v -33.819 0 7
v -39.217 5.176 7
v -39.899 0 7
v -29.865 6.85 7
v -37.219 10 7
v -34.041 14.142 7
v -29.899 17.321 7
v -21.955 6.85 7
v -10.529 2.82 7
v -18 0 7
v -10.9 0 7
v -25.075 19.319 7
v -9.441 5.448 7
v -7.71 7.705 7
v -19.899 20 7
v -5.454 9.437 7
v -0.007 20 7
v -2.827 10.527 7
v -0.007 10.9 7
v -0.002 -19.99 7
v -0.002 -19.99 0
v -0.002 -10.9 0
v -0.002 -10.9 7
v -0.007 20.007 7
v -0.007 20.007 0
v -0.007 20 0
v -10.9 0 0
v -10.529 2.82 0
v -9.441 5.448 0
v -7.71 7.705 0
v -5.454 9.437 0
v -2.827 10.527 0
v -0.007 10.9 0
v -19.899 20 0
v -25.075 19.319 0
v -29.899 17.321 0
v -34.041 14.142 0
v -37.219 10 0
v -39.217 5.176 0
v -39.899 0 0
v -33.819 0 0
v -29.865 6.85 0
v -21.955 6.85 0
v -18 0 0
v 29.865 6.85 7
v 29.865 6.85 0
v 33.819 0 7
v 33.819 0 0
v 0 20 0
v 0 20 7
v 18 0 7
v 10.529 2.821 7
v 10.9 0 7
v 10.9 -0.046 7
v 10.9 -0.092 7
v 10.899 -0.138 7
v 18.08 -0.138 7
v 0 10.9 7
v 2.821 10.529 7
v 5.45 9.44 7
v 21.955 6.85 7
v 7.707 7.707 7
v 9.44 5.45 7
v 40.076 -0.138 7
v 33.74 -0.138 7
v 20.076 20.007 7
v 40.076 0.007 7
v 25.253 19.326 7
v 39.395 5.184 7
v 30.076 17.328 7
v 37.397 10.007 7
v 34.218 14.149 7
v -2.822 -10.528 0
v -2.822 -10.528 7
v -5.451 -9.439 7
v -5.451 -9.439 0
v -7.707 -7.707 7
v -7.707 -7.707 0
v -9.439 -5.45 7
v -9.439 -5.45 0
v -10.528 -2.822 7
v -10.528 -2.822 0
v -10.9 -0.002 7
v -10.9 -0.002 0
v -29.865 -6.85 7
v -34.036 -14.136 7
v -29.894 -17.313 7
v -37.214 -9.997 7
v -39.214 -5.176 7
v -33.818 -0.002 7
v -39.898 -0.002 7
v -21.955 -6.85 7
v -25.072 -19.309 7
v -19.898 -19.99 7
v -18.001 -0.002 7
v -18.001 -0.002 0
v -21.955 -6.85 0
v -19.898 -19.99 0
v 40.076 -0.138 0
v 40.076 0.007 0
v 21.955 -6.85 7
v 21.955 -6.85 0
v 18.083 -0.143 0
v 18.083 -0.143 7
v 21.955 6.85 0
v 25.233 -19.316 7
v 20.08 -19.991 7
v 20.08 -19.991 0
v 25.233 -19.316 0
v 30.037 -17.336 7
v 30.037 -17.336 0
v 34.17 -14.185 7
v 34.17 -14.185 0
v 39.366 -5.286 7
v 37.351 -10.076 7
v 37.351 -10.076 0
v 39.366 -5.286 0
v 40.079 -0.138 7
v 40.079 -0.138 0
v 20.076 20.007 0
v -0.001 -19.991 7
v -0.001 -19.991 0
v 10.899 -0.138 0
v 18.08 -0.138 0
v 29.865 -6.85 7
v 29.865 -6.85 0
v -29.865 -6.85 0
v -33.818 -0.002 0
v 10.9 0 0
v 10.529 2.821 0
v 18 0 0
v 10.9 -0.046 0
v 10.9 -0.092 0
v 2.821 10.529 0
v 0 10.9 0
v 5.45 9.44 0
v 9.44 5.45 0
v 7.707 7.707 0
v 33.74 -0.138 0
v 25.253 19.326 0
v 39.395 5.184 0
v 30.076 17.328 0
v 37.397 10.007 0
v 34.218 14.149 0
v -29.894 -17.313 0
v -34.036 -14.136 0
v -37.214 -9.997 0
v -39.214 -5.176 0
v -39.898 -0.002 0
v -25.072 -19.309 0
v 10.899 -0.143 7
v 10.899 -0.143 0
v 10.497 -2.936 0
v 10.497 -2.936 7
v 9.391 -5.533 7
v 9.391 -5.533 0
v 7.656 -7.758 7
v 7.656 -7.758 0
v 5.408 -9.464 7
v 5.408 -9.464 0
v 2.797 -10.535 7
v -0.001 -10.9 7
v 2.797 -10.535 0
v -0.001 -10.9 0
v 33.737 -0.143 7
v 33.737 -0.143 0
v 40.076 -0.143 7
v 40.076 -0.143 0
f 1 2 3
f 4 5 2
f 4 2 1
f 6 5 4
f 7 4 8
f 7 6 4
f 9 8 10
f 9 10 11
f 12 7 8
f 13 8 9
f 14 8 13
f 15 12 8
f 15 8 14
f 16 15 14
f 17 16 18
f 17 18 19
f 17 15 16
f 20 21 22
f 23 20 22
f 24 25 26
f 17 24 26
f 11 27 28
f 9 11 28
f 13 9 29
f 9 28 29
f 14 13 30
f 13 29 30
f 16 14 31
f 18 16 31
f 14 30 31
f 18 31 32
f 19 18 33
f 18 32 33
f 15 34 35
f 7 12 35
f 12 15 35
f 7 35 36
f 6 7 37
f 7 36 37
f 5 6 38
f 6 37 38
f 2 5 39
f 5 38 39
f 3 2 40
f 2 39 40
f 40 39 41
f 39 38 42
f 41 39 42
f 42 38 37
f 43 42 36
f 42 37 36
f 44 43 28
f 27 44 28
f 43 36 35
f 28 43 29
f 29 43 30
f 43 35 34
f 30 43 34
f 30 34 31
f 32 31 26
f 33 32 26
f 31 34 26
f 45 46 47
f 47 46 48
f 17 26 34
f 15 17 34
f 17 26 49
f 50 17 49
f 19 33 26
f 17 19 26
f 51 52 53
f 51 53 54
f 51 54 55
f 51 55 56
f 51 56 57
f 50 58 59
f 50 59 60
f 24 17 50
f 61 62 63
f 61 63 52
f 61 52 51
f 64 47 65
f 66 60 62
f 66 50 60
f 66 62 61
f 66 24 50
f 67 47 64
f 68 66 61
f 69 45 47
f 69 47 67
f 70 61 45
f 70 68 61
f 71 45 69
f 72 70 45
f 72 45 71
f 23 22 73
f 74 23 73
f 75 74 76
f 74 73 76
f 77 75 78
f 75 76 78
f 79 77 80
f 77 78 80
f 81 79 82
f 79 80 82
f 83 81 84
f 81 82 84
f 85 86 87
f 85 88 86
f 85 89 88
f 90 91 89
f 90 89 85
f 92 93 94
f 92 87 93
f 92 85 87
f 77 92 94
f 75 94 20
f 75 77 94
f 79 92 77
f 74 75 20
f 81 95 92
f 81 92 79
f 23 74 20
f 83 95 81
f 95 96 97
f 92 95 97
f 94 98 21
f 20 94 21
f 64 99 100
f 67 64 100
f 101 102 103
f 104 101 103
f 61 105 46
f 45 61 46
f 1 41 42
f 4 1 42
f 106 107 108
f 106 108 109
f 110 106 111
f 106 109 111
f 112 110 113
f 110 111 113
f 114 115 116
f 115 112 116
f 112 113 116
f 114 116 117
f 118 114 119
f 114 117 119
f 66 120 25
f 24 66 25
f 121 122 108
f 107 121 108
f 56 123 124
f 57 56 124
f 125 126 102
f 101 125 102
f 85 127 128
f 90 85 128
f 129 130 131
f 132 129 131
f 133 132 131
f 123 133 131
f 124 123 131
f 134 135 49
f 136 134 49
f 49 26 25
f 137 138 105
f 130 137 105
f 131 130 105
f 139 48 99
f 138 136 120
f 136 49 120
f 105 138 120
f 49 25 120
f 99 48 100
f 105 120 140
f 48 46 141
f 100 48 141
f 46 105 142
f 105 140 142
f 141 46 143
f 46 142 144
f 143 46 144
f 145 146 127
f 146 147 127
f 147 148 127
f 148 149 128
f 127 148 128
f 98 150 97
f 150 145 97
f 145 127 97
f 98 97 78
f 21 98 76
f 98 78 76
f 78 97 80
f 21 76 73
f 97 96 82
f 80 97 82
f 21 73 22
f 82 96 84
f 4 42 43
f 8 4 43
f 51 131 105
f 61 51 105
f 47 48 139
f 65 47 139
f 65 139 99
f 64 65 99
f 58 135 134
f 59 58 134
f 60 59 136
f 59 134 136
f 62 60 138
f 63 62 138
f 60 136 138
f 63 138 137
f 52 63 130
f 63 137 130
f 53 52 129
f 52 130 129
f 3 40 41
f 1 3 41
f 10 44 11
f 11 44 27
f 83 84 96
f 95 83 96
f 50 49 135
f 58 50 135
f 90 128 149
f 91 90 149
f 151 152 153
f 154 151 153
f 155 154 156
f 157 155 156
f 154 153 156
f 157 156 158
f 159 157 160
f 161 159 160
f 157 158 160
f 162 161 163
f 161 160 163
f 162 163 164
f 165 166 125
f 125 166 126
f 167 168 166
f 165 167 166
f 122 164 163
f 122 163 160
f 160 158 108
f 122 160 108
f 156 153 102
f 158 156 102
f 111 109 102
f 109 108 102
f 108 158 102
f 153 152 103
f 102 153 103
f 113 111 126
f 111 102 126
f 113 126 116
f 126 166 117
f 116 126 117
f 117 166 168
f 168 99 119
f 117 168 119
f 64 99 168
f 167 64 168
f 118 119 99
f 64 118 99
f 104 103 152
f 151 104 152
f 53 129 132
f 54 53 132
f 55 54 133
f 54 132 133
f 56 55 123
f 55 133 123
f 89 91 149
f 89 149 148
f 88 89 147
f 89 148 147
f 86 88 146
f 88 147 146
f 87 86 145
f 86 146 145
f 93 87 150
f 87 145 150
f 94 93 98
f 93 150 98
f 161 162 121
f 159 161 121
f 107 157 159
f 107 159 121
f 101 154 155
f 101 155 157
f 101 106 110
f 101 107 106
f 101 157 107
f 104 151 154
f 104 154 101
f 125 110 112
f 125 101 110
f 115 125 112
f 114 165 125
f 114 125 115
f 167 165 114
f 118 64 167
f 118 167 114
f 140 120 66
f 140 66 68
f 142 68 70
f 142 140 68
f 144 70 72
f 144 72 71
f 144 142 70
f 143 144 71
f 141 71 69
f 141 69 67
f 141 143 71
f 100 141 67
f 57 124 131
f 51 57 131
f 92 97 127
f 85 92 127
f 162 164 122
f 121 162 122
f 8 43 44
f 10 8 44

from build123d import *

# Parameters (mm, degrees)
F1_DEPTH      = 7
F2_T1_DEPTH   = 107
F2_2_T1_DEPTH = 107
F2_3_T1_DEPTH = 107
F2_4_T1_DEPTH = 107


# Not quite as in the source:
# - a fillet or chamfer that OpenCascade refuses, or shapes differently, is made with other operations: its cross-section is extruded or revolved along the edge and cut away or added


with BuildPart() as f1:
    # F0 (on Top) → F1 (new body)
    with BuildSketch(Plane.XY):
        with BuildLine():
            Line((-0.0071190066, 20.0072696805), (-0.0071190066, 20))
            Line((-0.0071190066, 20), (0, 20))
            Line((0, 20), (0, 10.9))
            ThreePointArc((0, 10.9), (7.7074639149, 7.7074639149), (10.9, 0))
            ThreePointArc((10.9, 0), (10.899781335, -0.0690423694), (10.8991253488, -0.1380819688))
            Line((10.8991253488, -0.1380819688), (18.0797216618, -0.1380819688))
            Line((18.0797216618, -0.1380819688), (18, 0))
            Line((18, 0), (21.9548493439, 6.85))
            Line((21.9548493439, 6.85), (29.8645480318, 6.85))
            Line((29.8645480318, 6.85), (33.8193973758, 0))
            Line((33.8193973758, 0), (33.739675714, -0.1380819688))
            Line((33.739675714, -0.1380819688), (40.0763135217, -0.1380819688))
            Line((40.0763135217, -0.1380819688), (40.0763135217, 20.0072696805))
            Line((40.0763135217, 20.0072696805), (-0.0071190066, 20.0072696805))
        make_face()
    extrude(amount=F1_DEPTH)

    # F2#4: fillet of radius 20 on 1 edges, made by hand

    # F2_4_s2 → F2_4_t1 (cut)
    with BuildSketch(Plane.XY.offset(-50)):
        with BuildLine():
            ThreePointArc((20.0763135217, 20.0072696805), (34.2184491454, 14.1494053042), (40.0763135217, 0.0072696805))
            Line((40.0763135217, 0.0072696805), (40.0763135217, 20.0072696805))
            Line((40.0763135217, 20.0072696805), (20.0763135217, 20.0072696805))
        make_face()
    extrude(amount=F2_4_T1_DEPTH, mode=Mode.SUBTRACT)


with BuildPart() as f1b:
    # F0 (on Top) → F1, piece 2 (new body)
    with BuildSketch(Plane.XY):
        with BuildLine():
            Line((-39.8988322914, 0), (-33.8193973758, 0))
            Line((-33.8193973758, 0), (-29.8645480318, 6.85))
            Line((-29.8645480318, 6.85), (-21.9548493439, 6.85))
            Line((-21.9548493439, 6.85), (-18, 0))
            Line((-18, 0), (-10.9, 0))
            ThreePointArc((-10.9, 0), (-7.709980453, 7.7049465549), (-0.0071190066, 10.8999976752))
            Line((-0.0071190066, 10.8999976752), (-0.0071190066, 20))
            Line((-0.0071190066, 20), (-39.8988322914, 20))
            Line((-39.8988322914, 20), (-39.8988322914, 0))
        make_face()
    extrude(amount=F1_DEPTH)

    # F2: fillet of radius 20 on 1 edges, made by hand

    # F2_s2 → F2_t1 (cut)
    with BuildSketch(Plane.XY.offset(-50)):
        with BuildLine():
            ThreePointArc((-19.8988322914, 20), (-34.0409679151, 14.1421356237), (-39.8988322914, 0))
            Line((-39.8988322914, 0), (-39.8988322914, 20))
            Line((-39.8988322914, 20), (-19.8988322914, 20))
        make_face()
    extrude(amount=F2_T1_DEPTH, mode=Mode.SUBTRACT)


with BuildPart() as f1c:
    # F0 (on Top) → F1, piece 3 (new body)
    with BuildSketch(Plane.XY):
        with BuildLine():
            Line((-29.8645480318, -6.85), (-33.8183725607, -0.0017750319))
            Line((-33.8183725607, -0.0017750319), (-39.897811533, -0.0017750319))
            Line((-39.897811533, -0.0017750319), (-39.897811533, -19.9902126039))
            Line((-39.897811533, -19.9902126039), (-0.0018734138, -19.9902126039))
            Line((-0.0018734138, -19.9902126039), (-0.0018734138, -10.899999839))
            ThreePointArc((-0.0018734138, -10.899999839), (-7.7074986981, -7.7074291316), (-10.8999998555, -0.0017750319))
            Line((-10.8999998555, -0.0017750319), (-18.0010248151, -0.0017750319))
            Line((-18.0010248151, -0.0017750319), (-21.9548493439, -6.85))
            Line((-21.9548493439, -6.85), (-29.8645480318, -6.85))
        make_face()
    extrude(amount=F1_DEPTH)

    # F2#2: fillet of radius 20 on 1 edges, made by hand

    # F2_2_s2 → F2_2_t1 (cut)
    with BuildSketch(Plane.XY.offset(-50)):
        with BuildLine():
            ThreePointArc((-39.897811533, 0.0097873961), (-34.0399471567, -14.1323482276), (-19.897811533, -19.9902126039))
            Line((-19.897811533, -19.9902126039), (-39.897811533, -19.9902126039))
            Line((-39.897811533, -19.9902126039), (-39.897811533, 0.0097873961))
        make_face()
    extrude(amount=F2_2_T1_DEPTH, mode=Mode.SUBTRACT)


with BuildPart() as f1d:
    # F0 (on Top) → F1, piece 4 (new body)
    with BuildSketch(Plane.XY):
        with BuildLine():
            ThreePointArc((10.8990613818, -0.1430419341), (7.6563698297, -7.7582215121), (-0.0009950386, -10.8999999546))
            Line((-0.0009950386, -10.8999999546), (-0.0009950386, -19.9906610558))
            Line((-0.0009950386, -19.9906610558), (40.0799419763, -19.9906610558))
            Line((40.0799419763, -19.9906610558), (40.0799419763, -0.1380819688))
            Line((40.0799419763, -0.1380819688), (40.0763135217, -0.1380819688))
            Line((40.0763135217, -0.1380819688), (40.0763135217, -0.1430419341))
            Line((40.0763135217, -0.1430419341), (33.7368120767, -0.1430419341))
            Line((33.7368120767, -0.1430419341), (29.8645480318, -6.85))
            Line((29.8645480318, -6.85), (21.9548493439, -6.85))
            Line((21.9548493439, -6.85), (18.0825852991, -0.1430419341))
            Line((18.0825852991, -0.1430419341), (10.8990613818, -0.1430419341))
        make_face()
    extrude(amount=F1_DEPTH)

    # F2#3: fillet of radius 20 on 1 edges, made by hand

    # F2_3_s2 → F2_3_t1 (cut)
    with BuildSketch(Plane.XY.offset(-50)):
        with BuildLine():
            ThreePointArc((20.0799419763, -19.9906610558), (34.2220776, -14.1327966795), (40.0799419763, 0.0093389442))
            Line((40.0799419763, 0.0093389442), (40.0799419763, -19.9906610558))
            Line((40.0799419763, -19.9906610558), (20.0799419763, -19.9906610558))
        make_face()
    extrude(amount=F2_3_T1_DEPTH, mode=Mode.SUBTRACT)


solid = Compound([f1.part, f1b.part, f1c.part, f1d.part])
